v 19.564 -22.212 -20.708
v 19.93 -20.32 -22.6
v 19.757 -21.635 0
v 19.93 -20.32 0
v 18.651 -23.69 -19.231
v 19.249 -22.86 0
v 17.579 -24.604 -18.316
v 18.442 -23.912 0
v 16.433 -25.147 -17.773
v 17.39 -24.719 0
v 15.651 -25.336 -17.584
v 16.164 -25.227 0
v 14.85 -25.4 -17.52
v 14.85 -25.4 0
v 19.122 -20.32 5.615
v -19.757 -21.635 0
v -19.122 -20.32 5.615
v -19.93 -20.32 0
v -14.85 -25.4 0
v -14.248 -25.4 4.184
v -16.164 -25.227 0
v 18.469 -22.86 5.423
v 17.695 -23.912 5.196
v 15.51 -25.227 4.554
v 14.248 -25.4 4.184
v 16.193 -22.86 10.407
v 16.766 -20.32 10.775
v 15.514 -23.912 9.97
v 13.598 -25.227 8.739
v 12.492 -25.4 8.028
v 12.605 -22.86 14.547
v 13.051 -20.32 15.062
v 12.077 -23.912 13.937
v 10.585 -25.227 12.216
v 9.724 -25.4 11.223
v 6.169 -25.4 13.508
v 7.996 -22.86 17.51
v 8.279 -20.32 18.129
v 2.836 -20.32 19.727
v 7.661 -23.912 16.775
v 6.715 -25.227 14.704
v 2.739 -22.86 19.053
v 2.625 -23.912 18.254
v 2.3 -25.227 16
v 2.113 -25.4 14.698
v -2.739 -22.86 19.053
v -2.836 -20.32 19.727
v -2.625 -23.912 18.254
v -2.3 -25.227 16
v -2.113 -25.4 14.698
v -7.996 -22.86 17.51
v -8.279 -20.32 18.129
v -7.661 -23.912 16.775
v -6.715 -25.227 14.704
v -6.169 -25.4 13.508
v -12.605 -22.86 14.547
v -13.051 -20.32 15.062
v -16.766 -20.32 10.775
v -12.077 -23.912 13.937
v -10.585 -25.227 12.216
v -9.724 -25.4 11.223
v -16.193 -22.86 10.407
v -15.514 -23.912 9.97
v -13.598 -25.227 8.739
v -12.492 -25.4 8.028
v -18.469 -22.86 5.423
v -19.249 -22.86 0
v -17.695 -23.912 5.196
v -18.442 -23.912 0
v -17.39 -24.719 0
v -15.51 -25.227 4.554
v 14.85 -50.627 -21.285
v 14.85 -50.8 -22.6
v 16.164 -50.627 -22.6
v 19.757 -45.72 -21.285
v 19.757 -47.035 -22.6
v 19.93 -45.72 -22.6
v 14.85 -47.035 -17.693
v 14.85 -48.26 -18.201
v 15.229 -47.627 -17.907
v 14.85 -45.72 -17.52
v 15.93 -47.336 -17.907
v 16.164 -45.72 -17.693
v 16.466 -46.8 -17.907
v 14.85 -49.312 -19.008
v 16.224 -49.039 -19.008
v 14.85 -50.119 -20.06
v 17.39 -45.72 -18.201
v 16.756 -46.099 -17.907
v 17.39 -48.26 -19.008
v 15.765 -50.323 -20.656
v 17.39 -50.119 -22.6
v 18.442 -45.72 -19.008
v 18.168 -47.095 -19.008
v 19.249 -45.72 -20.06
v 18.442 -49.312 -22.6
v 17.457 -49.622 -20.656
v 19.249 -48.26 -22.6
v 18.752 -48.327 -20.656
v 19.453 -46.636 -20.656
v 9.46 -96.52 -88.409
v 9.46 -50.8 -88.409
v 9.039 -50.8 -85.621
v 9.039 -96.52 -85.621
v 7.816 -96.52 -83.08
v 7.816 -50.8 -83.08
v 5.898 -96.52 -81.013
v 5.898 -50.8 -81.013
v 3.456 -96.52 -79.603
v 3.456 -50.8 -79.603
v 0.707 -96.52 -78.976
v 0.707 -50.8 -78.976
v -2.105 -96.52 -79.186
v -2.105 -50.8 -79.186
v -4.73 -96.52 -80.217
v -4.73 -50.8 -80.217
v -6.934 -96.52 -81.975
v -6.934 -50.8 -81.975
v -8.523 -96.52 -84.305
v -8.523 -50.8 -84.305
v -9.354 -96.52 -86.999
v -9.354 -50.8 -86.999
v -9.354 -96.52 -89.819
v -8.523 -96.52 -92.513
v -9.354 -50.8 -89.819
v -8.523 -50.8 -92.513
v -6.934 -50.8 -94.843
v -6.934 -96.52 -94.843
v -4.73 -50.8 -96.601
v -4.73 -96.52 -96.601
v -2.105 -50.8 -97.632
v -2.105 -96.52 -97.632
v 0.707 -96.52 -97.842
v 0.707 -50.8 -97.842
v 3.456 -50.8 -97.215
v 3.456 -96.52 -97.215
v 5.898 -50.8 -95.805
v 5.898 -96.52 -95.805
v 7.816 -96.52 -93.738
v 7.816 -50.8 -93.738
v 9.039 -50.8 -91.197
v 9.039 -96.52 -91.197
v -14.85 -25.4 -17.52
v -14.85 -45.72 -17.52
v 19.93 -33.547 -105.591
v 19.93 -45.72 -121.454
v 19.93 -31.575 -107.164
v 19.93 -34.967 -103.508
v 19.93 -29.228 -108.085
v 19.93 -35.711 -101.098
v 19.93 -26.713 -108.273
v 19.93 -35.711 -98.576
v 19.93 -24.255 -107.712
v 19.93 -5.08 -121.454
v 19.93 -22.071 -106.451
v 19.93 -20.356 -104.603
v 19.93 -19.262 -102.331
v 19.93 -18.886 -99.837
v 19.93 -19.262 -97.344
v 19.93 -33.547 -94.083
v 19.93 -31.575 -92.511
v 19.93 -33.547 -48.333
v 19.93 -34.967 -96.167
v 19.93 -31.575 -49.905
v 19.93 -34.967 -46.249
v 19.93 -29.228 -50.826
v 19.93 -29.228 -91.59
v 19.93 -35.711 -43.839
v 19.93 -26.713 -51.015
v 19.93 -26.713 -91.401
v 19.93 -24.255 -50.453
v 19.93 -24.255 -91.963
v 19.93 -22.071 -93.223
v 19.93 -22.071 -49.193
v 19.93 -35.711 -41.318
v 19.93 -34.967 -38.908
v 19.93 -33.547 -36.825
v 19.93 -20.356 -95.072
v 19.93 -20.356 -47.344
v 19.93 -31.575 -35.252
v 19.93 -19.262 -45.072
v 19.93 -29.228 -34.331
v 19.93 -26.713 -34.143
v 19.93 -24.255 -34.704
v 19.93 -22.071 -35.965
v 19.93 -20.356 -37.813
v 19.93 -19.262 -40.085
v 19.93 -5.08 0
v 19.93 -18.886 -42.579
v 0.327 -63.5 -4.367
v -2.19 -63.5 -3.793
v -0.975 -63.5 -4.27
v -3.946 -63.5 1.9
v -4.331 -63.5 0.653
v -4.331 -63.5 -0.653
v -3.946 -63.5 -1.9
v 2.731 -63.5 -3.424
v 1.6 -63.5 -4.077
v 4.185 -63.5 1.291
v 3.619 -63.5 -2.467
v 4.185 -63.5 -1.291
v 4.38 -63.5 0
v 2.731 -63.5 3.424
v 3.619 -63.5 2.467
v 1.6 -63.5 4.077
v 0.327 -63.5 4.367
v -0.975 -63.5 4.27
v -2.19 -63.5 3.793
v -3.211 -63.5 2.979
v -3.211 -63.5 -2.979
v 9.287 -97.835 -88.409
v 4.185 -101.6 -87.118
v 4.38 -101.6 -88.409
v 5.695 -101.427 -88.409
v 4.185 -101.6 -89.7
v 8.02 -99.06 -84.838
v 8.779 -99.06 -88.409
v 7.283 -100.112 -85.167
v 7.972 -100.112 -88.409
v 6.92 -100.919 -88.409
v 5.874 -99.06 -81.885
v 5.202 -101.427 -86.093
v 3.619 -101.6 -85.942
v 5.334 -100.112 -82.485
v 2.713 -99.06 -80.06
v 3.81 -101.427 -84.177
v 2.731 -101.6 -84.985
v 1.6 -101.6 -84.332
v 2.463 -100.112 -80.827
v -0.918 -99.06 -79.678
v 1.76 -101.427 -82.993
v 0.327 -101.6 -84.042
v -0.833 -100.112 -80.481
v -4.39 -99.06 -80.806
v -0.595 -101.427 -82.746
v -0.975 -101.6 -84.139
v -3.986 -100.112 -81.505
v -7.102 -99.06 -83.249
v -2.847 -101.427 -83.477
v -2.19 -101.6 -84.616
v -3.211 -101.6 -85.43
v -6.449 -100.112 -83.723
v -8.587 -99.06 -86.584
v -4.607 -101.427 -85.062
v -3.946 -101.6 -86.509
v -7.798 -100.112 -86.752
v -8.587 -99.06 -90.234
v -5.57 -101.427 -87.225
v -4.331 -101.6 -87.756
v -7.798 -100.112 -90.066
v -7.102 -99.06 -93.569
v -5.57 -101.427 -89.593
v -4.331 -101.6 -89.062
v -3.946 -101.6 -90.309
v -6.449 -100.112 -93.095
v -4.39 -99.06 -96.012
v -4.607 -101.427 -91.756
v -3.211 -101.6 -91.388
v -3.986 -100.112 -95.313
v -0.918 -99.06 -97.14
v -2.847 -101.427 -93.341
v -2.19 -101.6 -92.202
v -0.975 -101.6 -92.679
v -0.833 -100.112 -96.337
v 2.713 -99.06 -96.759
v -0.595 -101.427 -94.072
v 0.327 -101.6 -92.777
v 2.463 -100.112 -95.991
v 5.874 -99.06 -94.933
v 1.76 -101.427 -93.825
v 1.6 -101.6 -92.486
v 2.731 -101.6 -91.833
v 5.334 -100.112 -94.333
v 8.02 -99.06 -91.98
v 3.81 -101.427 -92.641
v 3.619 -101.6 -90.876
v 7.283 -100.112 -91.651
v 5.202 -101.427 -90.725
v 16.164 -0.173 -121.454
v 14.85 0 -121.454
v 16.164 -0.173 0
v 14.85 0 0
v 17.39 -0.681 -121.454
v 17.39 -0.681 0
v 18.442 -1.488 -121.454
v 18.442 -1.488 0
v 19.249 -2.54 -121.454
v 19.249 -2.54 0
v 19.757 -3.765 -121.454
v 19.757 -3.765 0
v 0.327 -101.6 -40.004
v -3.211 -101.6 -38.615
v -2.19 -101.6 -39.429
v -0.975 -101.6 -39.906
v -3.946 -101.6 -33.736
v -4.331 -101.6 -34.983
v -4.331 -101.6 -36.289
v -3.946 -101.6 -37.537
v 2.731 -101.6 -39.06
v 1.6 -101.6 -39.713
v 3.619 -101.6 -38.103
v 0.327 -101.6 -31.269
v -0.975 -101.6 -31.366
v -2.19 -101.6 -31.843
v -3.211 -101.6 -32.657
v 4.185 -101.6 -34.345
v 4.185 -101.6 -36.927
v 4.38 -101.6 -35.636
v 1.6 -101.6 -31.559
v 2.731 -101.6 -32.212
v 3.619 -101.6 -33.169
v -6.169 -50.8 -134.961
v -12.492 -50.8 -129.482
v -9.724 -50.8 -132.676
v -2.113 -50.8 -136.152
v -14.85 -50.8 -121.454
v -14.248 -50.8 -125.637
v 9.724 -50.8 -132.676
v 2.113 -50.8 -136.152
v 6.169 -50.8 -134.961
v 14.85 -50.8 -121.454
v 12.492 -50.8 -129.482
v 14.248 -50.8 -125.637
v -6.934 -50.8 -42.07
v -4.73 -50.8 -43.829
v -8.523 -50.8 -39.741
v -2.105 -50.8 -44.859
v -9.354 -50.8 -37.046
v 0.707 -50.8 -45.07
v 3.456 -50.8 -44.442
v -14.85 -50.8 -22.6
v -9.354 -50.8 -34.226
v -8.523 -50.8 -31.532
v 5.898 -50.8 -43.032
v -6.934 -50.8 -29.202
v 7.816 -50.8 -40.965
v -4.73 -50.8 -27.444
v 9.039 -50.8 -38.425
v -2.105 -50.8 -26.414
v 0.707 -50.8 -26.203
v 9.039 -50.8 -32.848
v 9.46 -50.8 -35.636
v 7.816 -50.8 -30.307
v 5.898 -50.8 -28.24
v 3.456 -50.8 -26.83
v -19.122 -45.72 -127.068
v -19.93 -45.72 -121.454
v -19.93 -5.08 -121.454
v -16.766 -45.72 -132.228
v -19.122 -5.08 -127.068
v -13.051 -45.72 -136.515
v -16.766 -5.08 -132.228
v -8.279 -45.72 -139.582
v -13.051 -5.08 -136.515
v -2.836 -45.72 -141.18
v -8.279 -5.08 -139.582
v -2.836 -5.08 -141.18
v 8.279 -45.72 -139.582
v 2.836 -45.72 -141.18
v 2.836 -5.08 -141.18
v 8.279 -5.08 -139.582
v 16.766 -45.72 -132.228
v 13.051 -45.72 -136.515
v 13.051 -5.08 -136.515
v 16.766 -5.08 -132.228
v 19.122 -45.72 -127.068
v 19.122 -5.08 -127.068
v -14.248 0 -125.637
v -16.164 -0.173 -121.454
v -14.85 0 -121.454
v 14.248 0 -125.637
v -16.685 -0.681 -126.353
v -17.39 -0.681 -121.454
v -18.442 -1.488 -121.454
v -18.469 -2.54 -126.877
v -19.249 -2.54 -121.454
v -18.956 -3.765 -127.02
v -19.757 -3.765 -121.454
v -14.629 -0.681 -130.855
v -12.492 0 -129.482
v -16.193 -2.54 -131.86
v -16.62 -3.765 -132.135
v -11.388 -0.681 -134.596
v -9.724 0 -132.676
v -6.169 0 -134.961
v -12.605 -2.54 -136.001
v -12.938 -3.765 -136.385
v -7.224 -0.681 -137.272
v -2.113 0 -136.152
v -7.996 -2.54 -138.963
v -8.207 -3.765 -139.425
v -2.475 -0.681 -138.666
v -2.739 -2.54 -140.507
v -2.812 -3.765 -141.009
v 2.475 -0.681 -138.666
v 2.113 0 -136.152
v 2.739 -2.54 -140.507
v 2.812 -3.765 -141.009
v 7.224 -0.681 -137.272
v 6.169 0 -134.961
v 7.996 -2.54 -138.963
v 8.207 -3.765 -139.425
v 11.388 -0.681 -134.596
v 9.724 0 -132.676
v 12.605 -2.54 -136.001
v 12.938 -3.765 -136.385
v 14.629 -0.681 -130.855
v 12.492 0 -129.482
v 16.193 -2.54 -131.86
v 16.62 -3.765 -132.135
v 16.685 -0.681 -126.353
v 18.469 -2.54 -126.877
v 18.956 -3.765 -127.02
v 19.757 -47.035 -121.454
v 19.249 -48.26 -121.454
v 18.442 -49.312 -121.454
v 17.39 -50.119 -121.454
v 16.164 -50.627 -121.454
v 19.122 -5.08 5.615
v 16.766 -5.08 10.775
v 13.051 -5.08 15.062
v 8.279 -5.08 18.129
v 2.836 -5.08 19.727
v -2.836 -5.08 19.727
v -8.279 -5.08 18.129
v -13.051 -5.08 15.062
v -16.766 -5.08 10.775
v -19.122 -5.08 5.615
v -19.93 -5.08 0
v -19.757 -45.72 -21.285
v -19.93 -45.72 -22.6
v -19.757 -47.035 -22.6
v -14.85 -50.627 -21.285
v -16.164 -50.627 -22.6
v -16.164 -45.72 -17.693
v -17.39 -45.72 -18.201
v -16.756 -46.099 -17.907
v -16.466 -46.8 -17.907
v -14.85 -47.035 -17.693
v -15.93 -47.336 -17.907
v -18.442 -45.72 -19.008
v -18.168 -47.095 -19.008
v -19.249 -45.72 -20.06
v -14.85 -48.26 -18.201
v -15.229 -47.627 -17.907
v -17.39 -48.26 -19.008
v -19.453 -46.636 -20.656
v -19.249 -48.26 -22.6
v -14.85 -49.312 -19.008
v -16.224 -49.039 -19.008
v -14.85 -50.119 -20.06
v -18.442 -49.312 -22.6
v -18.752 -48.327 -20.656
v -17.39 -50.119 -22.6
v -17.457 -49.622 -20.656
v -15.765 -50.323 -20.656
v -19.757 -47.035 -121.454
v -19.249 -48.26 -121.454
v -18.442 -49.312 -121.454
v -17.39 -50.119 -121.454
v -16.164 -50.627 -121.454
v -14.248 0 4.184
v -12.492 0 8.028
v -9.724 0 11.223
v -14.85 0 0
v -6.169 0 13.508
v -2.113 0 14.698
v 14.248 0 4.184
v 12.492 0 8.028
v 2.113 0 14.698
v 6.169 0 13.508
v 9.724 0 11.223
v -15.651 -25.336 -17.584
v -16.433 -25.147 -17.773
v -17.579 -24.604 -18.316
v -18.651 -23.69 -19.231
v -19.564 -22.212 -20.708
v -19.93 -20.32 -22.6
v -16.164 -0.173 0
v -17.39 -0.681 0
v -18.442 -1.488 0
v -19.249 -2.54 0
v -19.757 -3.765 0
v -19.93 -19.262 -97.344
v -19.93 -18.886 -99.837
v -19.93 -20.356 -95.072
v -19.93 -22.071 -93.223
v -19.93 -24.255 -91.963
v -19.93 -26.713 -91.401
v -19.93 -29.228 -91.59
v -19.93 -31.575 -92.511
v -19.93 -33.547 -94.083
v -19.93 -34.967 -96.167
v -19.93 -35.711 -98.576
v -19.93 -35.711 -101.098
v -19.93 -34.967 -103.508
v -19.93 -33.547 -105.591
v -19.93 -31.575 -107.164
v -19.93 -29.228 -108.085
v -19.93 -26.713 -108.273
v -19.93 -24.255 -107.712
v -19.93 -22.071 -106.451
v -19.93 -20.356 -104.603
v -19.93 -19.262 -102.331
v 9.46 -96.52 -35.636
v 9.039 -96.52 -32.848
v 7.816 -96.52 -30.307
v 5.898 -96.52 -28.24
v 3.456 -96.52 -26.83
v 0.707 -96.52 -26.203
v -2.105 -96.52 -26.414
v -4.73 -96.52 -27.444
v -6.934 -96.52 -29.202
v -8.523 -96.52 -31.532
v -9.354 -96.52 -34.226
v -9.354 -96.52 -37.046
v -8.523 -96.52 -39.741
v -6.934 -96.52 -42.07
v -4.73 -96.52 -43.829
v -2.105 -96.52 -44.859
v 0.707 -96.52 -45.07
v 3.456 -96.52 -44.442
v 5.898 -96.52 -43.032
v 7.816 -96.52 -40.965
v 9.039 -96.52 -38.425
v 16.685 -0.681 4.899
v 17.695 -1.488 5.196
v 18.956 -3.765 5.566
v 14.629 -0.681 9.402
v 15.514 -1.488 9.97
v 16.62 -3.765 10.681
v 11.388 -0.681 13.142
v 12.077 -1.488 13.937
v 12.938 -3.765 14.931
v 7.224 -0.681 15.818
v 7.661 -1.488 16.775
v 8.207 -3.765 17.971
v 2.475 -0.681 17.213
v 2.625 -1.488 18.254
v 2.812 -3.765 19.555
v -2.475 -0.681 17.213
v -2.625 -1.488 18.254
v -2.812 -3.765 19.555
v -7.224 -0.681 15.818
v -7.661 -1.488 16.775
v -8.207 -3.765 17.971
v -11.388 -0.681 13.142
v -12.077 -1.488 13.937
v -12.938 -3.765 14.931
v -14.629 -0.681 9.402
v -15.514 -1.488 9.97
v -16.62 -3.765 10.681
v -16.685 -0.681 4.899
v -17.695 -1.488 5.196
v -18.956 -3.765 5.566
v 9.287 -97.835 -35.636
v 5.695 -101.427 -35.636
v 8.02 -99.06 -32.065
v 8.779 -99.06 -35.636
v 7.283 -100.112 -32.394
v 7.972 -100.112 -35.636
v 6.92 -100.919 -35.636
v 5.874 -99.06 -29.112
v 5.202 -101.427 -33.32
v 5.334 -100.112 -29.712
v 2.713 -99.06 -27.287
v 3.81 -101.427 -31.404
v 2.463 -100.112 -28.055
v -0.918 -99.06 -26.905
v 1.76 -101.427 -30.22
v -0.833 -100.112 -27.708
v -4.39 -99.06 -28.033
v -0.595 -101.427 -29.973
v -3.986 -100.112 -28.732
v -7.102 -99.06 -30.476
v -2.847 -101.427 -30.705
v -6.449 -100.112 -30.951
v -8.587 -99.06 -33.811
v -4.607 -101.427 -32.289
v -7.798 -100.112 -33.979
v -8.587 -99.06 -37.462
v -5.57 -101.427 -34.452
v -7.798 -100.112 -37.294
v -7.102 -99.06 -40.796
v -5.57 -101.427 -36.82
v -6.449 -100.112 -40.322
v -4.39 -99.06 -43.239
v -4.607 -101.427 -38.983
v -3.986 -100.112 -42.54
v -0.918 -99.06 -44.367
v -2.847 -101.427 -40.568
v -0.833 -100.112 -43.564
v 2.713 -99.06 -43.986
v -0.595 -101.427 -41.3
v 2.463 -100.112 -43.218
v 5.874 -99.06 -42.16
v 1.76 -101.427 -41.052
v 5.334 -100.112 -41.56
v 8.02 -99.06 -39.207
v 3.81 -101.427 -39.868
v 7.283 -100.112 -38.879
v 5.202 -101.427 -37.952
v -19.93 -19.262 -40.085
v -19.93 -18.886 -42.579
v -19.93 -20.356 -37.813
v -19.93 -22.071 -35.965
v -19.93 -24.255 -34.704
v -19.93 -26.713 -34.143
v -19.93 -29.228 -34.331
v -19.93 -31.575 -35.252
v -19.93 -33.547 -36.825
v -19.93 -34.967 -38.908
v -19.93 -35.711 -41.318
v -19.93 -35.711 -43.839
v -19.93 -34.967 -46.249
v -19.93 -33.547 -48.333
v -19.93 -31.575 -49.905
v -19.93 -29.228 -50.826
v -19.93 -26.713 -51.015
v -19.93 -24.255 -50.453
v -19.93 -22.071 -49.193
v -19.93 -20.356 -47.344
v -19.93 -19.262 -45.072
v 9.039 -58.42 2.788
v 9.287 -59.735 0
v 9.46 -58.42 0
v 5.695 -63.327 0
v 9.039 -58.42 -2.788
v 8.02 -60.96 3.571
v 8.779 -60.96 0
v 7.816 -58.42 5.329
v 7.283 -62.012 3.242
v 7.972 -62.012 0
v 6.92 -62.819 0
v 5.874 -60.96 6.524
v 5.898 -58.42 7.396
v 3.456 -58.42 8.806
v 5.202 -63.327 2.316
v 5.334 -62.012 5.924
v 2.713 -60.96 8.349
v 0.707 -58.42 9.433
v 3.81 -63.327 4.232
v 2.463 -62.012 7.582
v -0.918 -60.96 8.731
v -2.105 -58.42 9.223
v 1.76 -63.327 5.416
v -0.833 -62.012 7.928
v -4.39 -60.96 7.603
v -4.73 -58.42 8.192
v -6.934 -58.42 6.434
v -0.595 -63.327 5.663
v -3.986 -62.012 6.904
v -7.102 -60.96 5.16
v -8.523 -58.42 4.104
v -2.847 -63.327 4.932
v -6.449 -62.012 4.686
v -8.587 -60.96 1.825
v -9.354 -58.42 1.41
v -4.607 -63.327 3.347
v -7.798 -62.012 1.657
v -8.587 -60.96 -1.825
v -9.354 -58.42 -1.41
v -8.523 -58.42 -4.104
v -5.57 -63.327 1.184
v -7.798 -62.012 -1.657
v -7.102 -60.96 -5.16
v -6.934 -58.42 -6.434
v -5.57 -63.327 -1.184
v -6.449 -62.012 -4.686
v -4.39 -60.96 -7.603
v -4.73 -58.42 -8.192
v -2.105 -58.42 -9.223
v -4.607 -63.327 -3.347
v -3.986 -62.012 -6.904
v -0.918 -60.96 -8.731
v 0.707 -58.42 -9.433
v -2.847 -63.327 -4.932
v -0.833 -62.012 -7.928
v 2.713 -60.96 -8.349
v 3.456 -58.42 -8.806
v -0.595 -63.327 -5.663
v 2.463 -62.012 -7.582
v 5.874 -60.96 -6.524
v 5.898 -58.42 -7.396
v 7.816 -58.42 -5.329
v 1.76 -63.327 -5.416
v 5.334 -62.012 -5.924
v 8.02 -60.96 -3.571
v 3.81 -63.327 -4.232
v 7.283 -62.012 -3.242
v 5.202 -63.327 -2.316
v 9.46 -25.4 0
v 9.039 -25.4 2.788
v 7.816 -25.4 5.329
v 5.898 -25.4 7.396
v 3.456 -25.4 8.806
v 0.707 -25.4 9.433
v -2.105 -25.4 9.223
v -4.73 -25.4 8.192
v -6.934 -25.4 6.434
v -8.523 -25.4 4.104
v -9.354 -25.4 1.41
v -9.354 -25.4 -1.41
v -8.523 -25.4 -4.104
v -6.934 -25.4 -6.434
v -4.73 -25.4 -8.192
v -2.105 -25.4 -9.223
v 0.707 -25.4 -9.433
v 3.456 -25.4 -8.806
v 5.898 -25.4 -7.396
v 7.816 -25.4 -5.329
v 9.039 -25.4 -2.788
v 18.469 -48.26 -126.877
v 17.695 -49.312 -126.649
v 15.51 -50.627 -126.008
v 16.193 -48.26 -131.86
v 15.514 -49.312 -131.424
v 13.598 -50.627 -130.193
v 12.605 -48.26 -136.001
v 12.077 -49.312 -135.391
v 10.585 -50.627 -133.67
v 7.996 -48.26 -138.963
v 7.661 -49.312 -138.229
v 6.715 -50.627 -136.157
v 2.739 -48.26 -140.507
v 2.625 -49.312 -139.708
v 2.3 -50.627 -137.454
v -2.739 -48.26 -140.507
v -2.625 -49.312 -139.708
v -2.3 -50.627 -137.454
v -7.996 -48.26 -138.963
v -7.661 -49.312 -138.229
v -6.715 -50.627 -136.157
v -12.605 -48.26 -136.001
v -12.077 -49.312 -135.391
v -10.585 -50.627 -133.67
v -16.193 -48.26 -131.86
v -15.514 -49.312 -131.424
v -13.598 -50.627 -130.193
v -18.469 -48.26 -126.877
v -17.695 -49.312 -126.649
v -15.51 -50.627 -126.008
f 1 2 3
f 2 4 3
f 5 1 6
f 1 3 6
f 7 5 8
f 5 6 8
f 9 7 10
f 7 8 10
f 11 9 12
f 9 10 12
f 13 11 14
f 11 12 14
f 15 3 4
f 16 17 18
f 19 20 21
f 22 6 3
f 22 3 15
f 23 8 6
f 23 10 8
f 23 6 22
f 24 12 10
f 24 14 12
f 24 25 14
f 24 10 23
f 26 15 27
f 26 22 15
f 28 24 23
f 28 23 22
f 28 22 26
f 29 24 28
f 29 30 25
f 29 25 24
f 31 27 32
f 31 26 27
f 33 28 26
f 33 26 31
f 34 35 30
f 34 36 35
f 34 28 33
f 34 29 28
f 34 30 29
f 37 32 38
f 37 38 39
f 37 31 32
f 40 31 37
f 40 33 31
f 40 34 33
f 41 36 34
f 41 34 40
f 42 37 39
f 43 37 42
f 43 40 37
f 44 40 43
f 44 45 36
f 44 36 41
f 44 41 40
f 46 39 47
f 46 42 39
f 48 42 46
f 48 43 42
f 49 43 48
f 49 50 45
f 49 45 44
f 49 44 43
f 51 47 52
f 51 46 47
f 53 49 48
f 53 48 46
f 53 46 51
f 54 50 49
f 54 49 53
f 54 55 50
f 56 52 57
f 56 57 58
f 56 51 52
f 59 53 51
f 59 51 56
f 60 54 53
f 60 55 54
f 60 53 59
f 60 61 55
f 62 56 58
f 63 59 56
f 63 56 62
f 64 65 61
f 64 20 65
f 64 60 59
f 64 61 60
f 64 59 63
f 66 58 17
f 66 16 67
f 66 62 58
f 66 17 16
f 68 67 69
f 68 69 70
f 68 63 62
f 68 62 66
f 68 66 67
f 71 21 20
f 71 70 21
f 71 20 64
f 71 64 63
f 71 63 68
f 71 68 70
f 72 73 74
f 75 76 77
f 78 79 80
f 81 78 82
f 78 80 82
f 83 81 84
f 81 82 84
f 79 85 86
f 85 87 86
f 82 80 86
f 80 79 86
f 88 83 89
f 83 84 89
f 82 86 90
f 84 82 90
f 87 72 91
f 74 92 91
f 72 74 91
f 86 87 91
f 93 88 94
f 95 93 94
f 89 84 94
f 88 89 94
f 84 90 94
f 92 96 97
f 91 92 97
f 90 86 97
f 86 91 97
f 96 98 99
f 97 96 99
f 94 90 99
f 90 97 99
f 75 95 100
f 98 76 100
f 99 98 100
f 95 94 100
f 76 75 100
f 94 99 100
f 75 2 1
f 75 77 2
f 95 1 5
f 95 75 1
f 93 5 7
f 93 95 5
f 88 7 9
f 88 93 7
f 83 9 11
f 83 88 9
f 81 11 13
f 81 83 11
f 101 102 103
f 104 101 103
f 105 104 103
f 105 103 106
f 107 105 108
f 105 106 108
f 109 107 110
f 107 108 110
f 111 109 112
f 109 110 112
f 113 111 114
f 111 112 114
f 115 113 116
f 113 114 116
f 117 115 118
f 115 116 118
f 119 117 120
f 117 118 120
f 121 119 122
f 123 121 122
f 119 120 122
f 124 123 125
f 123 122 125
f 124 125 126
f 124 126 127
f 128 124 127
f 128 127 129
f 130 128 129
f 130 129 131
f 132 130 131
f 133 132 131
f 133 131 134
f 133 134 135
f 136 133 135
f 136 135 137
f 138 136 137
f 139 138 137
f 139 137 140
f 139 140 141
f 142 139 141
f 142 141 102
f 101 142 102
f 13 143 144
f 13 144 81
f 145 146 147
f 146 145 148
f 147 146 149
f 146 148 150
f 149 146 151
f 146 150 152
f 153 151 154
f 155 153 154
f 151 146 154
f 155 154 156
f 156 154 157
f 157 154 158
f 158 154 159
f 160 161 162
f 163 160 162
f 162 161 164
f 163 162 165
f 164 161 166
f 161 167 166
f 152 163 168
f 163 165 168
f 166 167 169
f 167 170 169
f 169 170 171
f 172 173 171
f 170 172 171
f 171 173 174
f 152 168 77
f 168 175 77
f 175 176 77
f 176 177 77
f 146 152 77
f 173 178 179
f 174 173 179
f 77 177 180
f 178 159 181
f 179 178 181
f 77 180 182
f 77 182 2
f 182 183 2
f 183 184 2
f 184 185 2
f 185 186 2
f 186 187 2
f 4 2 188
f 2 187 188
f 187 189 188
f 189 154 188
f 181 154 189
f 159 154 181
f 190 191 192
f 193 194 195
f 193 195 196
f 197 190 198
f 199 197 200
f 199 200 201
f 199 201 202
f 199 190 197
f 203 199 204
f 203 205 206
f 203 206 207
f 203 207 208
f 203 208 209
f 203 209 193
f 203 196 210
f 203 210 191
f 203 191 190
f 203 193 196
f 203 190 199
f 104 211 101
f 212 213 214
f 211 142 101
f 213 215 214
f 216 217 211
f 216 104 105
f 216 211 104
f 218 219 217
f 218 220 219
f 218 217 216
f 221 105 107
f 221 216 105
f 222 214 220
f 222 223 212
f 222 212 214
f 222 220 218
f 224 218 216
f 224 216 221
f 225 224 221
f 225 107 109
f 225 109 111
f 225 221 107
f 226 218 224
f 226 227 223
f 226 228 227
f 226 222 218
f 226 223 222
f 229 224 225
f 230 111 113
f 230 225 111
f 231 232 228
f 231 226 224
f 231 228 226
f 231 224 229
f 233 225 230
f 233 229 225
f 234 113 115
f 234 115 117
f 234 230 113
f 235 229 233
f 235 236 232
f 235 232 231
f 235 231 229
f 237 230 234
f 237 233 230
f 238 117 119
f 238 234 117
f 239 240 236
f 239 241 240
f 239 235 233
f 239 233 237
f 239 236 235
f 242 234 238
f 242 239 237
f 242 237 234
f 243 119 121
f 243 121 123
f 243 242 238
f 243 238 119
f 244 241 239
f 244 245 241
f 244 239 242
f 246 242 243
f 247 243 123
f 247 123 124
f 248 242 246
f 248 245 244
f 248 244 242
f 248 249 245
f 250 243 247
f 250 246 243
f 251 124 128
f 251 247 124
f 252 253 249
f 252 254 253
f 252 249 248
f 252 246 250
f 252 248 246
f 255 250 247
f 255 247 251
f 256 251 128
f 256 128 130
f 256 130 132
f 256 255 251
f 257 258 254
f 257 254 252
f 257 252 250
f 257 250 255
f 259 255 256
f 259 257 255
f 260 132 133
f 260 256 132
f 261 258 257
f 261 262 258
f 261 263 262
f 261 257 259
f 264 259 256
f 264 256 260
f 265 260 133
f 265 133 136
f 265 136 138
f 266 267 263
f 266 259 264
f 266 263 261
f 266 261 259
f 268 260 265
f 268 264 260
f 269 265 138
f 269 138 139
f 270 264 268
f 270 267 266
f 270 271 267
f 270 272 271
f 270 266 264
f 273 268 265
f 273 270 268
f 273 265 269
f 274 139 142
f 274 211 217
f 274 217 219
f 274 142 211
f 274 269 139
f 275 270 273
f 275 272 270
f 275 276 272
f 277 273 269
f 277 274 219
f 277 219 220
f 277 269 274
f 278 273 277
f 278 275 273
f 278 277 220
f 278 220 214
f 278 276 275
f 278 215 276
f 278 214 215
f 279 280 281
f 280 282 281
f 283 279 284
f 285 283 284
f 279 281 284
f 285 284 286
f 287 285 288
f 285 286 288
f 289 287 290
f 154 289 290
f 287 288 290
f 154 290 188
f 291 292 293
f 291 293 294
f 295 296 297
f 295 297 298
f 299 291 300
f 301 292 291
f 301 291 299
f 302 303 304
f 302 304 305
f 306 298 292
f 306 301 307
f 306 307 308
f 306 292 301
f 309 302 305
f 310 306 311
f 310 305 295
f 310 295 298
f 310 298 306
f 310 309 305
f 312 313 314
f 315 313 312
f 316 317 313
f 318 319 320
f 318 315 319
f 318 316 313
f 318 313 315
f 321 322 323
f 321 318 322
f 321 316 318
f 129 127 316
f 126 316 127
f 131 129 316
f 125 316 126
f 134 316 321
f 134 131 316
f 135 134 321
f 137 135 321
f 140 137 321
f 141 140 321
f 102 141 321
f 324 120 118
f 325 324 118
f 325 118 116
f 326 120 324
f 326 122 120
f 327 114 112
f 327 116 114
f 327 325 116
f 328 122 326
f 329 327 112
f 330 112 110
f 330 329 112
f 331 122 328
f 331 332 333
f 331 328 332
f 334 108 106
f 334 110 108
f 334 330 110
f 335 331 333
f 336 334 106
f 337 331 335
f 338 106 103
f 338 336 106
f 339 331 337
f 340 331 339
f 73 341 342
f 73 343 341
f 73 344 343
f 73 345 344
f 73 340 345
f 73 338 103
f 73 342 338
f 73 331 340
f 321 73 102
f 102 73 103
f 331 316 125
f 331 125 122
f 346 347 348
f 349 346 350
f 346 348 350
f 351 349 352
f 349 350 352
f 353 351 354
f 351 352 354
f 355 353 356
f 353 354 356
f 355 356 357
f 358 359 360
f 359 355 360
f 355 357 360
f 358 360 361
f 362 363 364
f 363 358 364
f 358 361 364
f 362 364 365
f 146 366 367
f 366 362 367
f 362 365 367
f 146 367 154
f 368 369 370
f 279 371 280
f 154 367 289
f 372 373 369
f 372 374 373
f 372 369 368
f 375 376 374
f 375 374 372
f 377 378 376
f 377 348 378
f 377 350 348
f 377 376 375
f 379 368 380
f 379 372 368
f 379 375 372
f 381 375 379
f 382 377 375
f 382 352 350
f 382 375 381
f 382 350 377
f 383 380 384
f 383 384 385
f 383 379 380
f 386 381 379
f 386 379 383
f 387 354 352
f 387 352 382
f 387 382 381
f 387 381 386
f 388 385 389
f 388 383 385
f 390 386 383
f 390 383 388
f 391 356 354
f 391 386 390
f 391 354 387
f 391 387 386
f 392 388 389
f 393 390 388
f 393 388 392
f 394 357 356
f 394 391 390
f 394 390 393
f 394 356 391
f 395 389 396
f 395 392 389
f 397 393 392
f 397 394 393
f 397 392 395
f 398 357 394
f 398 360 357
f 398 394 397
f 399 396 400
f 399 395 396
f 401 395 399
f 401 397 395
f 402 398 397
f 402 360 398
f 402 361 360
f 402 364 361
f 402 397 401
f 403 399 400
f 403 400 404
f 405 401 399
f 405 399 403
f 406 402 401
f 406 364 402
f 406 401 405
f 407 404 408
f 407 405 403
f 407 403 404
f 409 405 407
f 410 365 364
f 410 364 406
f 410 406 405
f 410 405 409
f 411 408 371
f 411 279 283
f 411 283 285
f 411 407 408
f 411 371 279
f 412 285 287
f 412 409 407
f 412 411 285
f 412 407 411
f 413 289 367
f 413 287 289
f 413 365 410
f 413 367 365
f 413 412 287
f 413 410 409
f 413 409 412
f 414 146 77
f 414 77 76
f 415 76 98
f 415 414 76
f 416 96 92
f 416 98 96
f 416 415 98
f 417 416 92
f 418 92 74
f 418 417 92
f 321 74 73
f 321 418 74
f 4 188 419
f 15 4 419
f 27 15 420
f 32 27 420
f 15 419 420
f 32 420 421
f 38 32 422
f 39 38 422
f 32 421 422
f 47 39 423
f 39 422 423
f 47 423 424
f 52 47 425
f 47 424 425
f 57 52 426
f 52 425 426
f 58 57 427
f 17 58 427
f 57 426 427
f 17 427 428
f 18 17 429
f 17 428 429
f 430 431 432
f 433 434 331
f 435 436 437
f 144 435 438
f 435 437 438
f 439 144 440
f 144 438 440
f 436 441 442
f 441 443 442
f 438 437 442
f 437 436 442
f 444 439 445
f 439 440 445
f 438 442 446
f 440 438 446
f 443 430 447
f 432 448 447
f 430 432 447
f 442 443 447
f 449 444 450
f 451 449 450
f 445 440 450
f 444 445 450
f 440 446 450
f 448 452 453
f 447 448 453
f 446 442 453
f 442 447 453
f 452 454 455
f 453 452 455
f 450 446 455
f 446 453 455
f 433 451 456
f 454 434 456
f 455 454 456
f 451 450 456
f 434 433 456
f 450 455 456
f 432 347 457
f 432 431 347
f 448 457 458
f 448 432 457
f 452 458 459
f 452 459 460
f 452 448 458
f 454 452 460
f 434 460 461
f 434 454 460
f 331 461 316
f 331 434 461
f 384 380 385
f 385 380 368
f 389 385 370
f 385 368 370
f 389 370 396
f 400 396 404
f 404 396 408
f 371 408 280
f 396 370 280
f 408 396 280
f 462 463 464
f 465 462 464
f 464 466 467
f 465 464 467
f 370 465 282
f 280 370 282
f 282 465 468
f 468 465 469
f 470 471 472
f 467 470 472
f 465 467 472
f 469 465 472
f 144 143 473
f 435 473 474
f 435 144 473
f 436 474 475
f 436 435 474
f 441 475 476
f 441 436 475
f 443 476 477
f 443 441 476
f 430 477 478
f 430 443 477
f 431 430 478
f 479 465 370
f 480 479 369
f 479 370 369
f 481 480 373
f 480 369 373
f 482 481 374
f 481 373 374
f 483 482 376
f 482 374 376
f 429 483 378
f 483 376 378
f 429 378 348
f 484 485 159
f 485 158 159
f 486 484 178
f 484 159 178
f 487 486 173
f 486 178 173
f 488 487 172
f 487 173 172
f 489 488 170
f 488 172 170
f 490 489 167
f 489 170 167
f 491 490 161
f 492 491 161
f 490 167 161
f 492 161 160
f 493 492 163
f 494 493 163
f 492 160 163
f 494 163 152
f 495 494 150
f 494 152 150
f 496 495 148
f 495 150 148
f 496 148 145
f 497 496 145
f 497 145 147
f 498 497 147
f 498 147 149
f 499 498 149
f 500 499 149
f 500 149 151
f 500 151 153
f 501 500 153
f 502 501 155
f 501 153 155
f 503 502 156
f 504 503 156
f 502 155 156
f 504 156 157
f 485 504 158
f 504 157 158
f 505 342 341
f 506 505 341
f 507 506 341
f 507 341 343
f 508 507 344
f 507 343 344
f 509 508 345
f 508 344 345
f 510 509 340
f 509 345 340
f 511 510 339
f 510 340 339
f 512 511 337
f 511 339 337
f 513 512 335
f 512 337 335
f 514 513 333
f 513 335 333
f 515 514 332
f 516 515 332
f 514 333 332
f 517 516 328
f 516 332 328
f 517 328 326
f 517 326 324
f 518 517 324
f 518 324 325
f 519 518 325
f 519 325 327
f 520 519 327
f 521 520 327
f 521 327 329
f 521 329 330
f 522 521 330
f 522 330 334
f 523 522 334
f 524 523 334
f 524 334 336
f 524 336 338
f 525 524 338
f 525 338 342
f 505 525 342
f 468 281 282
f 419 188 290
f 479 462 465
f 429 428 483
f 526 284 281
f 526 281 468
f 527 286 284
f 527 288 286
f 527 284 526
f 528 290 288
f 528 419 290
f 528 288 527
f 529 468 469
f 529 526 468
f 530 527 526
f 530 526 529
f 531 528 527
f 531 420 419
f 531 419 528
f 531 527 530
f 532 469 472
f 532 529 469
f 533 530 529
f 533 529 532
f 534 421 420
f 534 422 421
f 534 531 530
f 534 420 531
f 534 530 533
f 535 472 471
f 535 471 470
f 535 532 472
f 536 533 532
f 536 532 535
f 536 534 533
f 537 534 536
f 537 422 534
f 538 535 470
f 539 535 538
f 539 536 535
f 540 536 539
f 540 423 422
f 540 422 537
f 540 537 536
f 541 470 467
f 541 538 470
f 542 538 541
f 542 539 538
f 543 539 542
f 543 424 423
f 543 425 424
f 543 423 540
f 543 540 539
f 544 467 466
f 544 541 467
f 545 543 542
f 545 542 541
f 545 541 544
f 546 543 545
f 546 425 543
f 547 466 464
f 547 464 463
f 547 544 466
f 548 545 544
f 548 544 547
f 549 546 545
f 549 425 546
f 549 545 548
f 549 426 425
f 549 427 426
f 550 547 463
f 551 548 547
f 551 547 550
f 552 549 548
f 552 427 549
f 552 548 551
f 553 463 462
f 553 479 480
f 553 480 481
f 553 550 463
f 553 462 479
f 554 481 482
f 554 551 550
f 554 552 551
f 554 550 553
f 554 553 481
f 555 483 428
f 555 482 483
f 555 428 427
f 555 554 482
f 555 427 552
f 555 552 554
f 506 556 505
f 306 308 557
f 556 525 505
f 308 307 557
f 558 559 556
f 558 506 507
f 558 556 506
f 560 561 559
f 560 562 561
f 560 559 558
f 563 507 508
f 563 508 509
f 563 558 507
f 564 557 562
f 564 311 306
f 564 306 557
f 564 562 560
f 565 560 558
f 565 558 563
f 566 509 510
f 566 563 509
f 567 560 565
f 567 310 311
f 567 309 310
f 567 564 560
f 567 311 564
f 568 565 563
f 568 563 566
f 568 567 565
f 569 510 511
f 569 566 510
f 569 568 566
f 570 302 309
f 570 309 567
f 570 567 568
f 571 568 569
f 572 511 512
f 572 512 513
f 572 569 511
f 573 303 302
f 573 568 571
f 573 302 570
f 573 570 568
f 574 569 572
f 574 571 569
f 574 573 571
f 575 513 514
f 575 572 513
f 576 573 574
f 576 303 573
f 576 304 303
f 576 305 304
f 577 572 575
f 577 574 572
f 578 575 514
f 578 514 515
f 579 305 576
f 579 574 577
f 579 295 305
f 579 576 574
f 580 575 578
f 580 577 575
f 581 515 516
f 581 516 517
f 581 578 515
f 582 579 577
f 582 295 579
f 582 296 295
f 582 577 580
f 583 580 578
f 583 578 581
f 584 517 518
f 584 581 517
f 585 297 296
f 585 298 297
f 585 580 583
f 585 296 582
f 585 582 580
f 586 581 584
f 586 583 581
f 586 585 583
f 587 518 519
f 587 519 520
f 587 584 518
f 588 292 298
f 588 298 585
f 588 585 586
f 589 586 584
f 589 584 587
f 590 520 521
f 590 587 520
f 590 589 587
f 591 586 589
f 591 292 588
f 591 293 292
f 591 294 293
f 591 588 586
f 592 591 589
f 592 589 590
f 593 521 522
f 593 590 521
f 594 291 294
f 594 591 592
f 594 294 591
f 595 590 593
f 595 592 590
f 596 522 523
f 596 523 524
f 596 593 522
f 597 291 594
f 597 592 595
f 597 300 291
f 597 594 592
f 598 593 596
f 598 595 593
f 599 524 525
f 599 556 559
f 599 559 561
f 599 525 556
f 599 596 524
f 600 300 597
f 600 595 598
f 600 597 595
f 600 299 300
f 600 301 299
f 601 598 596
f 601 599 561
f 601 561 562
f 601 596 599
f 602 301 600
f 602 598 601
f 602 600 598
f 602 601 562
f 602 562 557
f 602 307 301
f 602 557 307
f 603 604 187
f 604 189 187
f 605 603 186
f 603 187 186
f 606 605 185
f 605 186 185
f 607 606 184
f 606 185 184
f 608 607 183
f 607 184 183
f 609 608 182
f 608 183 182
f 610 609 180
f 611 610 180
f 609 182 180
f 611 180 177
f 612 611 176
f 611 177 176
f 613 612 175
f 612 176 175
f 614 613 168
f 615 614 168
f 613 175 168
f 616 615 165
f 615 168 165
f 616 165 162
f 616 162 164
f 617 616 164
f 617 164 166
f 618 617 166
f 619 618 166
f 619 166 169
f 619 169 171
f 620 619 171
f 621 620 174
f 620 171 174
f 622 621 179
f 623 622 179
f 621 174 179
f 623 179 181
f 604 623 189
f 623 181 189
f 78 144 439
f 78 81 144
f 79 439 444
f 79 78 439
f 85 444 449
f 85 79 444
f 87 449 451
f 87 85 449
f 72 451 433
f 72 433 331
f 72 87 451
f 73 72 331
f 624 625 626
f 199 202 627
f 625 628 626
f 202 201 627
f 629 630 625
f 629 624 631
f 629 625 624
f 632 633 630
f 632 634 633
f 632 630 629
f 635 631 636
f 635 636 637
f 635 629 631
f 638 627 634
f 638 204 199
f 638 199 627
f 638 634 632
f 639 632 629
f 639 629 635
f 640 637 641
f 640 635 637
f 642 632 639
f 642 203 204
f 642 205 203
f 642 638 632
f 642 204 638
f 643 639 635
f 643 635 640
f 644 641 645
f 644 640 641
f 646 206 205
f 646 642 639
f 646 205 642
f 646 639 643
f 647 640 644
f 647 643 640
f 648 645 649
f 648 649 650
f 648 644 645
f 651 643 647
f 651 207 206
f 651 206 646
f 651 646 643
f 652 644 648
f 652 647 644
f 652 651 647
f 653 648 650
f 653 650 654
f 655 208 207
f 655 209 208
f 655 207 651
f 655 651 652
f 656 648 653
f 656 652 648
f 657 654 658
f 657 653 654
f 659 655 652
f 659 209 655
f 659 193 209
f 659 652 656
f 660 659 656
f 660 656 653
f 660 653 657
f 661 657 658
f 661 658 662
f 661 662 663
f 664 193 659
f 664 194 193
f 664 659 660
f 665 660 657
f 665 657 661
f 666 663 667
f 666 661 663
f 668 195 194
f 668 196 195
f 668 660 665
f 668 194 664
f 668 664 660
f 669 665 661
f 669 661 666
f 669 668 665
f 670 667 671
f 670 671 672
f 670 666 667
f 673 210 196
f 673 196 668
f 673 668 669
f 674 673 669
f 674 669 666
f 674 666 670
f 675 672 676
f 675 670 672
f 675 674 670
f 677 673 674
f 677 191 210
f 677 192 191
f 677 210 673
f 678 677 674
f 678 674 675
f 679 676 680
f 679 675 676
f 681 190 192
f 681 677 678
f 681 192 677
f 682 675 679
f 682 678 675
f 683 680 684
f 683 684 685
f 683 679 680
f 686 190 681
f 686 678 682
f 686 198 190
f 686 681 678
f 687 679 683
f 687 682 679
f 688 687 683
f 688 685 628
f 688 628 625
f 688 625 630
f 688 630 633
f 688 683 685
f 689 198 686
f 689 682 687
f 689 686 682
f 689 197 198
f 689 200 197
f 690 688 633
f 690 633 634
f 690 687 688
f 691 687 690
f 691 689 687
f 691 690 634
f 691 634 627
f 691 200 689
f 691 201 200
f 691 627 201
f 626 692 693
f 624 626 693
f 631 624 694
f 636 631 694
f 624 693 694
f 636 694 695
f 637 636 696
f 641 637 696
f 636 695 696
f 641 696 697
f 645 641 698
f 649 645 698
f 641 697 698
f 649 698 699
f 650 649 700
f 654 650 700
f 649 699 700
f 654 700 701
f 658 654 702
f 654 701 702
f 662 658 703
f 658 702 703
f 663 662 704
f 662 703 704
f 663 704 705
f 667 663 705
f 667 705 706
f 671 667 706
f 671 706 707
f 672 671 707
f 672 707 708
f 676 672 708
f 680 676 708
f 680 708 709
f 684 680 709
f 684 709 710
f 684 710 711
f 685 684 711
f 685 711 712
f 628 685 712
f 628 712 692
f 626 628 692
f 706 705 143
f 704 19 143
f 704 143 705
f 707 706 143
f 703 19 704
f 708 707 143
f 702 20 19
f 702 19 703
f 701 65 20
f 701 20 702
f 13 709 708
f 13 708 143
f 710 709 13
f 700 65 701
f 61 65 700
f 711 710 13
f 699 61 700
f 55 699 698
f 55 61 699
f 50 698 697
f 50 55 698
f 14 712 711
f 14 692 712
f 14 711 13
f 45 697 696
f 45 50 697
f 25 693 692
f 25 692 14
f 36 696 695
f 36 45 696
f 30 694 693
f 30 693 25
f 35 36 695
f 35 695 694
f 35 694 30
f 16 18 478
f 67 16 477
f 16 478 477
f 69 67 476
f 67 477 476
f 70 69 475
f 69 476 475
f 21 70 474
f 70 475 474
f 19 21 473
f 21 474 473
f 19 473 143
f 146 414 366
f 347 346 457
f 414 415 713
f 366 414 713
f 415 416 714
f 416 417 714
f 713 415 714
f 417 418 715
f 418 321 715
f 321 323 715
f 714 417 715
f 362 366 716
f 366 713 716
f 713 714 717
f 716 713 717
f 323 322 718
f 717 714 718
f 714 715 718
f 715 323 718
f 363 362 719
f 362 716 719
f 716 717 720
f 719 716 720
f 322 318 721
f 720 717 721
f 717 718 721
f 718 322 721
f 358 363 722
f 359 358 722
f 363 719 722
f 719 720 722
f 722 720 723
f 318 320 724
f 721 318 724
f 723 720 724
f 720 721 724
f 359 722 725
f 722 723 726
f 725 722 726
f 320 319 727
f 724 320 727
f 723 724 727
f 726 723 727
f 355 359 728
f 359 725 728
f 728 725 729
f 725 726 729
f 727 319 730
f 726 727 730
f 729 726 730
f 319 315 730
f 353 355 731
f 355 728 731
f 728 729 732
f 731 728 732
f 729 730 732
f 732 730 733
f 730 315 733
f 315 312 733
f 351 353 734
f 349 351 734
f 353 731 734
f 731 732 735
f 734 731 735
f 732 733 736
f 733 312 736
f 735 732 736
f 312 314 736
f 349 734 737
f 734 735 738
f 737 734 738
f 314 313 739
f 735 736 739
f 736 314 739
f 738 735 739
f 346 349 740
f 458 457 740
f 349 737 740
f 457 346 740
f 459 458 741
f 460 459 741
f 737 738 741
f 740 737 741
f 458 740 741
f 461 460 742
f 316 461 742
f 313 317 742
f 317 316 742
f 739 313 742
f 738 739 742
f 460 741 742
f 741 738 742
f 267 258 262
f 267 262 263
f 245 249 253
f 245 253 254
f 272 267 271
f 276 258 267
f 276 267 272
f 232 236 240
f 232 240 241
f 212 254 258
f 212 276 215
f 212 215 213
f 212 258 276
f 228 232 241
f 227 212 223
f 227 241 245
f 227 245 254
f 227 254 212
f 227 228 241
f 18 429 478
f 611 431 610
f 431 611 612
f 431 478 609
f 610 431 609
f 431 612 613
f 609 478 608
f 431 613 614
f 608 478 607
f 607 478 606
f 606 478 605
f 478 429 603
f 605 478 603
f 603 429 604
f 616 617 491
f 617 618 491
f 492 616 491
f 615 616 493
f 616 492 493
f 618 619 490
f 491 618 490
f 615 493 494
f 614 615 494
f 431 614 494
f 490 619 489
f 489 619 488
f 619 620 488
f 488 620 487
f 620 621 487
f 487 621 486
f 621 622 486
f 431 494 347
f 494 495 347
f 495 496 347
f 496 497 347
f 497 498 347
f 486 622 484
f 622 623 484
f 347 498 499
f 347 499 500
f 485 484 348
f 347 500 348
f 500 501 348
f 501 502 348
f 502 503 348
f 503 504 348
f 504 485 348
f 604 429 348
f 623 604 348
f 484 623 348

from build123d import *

# Parameters (mm, degrees)
F0_R     = 9.4597461698
F1_DEPTH = 101.6
F0_W     = 39.8592872384
F0_H     = 103.9333879682
F2_DEPTH = 50.8
F3_DEPTH = 25.4
F4_DEPTH = 63.5
F5_R     = 5.08
F6_R     = 5.08
F7_R     = 5.08
F8_R     = 8.4595796919
F9_DEPTH = 25.4
F12_R    = 5.08


# Not quite as in the source:
# - the program builds the solid bodies; features that only make, move or delete a surface that nothing else refers to are left out


with BuildPart() as f1:
    # F0 (on Front) → F1 (new body)
    with BuildSketch(Plane.XZ):
        with Locations((0, -35.6362370717)):
            Circle(F0_R)
    extrude(amount=F1_DEPTH)



with BuildPart() as f1b:
    # F0 (on Front) → F1, piece 2 (new body)
    with BuildSketch(Plane.XZ):
        with Locations((0, -88.4090361273)):
            Circle(F0_R)
    extrude(amount=F1_DEPTH)


with BuildPart() as f1_1:
    add(f1.part)

    add(f1b.part)  # F2 merges F1b
    # F0 (on Front) → F2 (join)
    with BuildSketch(Plane.XZ):
        with Locations((0, -69.4868988952)):
            Rectangle(F0_W, F0_H)
        with Locations((0, -88.4090361273)):
            Circle(F0_R, mode=Mode.SUBTRACT)
        with Locations((0, -35.6362370717)):
            Circle(F0_R, mode=Mode.SUBTRACT)
        with BuildLine():
            ThreePointArc((-19.9296436192, -121.4535928793), (0, -141.3832364985), (19.9296436192, -121.4535928793))
            Line((19.9296436192, -121.4535928793), (-19.9296436192, -121.4535928793))
        make_face()
    extrude(amount=F2_DEPTH)

    # F0 (on Front) → F3 (join)
    with BuildSketch(Plane.XZ):
        with BuildLine():
            Line((19.9296436192, -17.5202049111), (19.9296436192, 0))
            ThreePointArc((19.9296436192, 0), (0, 19.9296436192), (-19.9296436192, 0))
            Line((-19.9296436192, 0), (-19.9296436192, -17.5202049111))
            Line((-19.9296436192, -17.5202049111), (19.9296436192, -17.5202049111))
        make_face()
        Circle(F0_R, mode=Mode.SUBTRACT)
    extrude(amount=F3_DEPTH)

    # F0 (on Front) → F4 (join)
    with BuildSketch(Plane.XZ):
        Circle(F0_R)
    extrude(amount=F4_DEPTH)

    # F5
    f5_edges = [f1_1.edges().sort_by_distance(p)[0] for p in [
        (-19.929644, -50.8, -69.486899),
        (-19.929644, -38.1, -17.520205),
        (19.929644, -50.8, -69.486899),
        (0, -50.8, -17.520205),
        (19.929644, -38.1, -17.520205),
    ]]
    fillet(f5_edges, radius=F5_R)

    # F6
    f6_edges = [f1_1.edges().sort_by_distance(p)[0] for p in [
        (19.929644, 0, -60.726796),
        (0, 0, 19.929644),
        (-19.929644, 0, -60.726796),
        (0, 0, -141.383236),
    ]]
    fillet(f6_edges, radius=F6_R)

    # F7
    f7_edges = [f1_1.edges().sort_by_distance(p)[0] for p in [
        (-19.929644, -25.4, -8.760102),
        (-19.929644, -25.4, -20.060205),
        (0, -25.4, 19.929644),
        (19.929644, -15.24, 0),
    ]]
    fillet(f7_edges, radius=F7_R)

    # F8 (on Right) → F9 (cut, symmetric)
    with BuildSketch(Plane.YZ):
        with Locations((-27.3456163704, -42.5785966218)):
            Circle(F8_R)
        with Locations((-27.3456163704, -99.8373031616)):
            Circle(F8_R)
    extrude(amount=F9_DEPTH, both=True, mode=Mode.SUBTRACT)

    # F12
    f12_edges = [f1_1.edges().sort_by_distance(p)[0] for p in [
        (-9.459746, -101.6, -88.409036),
        (-9.459746, -101.6, -35.636237),
        (-9.459746, -63.5, 0),
    ]]
    fillet(f12_edges, radius=F12_R)


solid = f1_1.part
